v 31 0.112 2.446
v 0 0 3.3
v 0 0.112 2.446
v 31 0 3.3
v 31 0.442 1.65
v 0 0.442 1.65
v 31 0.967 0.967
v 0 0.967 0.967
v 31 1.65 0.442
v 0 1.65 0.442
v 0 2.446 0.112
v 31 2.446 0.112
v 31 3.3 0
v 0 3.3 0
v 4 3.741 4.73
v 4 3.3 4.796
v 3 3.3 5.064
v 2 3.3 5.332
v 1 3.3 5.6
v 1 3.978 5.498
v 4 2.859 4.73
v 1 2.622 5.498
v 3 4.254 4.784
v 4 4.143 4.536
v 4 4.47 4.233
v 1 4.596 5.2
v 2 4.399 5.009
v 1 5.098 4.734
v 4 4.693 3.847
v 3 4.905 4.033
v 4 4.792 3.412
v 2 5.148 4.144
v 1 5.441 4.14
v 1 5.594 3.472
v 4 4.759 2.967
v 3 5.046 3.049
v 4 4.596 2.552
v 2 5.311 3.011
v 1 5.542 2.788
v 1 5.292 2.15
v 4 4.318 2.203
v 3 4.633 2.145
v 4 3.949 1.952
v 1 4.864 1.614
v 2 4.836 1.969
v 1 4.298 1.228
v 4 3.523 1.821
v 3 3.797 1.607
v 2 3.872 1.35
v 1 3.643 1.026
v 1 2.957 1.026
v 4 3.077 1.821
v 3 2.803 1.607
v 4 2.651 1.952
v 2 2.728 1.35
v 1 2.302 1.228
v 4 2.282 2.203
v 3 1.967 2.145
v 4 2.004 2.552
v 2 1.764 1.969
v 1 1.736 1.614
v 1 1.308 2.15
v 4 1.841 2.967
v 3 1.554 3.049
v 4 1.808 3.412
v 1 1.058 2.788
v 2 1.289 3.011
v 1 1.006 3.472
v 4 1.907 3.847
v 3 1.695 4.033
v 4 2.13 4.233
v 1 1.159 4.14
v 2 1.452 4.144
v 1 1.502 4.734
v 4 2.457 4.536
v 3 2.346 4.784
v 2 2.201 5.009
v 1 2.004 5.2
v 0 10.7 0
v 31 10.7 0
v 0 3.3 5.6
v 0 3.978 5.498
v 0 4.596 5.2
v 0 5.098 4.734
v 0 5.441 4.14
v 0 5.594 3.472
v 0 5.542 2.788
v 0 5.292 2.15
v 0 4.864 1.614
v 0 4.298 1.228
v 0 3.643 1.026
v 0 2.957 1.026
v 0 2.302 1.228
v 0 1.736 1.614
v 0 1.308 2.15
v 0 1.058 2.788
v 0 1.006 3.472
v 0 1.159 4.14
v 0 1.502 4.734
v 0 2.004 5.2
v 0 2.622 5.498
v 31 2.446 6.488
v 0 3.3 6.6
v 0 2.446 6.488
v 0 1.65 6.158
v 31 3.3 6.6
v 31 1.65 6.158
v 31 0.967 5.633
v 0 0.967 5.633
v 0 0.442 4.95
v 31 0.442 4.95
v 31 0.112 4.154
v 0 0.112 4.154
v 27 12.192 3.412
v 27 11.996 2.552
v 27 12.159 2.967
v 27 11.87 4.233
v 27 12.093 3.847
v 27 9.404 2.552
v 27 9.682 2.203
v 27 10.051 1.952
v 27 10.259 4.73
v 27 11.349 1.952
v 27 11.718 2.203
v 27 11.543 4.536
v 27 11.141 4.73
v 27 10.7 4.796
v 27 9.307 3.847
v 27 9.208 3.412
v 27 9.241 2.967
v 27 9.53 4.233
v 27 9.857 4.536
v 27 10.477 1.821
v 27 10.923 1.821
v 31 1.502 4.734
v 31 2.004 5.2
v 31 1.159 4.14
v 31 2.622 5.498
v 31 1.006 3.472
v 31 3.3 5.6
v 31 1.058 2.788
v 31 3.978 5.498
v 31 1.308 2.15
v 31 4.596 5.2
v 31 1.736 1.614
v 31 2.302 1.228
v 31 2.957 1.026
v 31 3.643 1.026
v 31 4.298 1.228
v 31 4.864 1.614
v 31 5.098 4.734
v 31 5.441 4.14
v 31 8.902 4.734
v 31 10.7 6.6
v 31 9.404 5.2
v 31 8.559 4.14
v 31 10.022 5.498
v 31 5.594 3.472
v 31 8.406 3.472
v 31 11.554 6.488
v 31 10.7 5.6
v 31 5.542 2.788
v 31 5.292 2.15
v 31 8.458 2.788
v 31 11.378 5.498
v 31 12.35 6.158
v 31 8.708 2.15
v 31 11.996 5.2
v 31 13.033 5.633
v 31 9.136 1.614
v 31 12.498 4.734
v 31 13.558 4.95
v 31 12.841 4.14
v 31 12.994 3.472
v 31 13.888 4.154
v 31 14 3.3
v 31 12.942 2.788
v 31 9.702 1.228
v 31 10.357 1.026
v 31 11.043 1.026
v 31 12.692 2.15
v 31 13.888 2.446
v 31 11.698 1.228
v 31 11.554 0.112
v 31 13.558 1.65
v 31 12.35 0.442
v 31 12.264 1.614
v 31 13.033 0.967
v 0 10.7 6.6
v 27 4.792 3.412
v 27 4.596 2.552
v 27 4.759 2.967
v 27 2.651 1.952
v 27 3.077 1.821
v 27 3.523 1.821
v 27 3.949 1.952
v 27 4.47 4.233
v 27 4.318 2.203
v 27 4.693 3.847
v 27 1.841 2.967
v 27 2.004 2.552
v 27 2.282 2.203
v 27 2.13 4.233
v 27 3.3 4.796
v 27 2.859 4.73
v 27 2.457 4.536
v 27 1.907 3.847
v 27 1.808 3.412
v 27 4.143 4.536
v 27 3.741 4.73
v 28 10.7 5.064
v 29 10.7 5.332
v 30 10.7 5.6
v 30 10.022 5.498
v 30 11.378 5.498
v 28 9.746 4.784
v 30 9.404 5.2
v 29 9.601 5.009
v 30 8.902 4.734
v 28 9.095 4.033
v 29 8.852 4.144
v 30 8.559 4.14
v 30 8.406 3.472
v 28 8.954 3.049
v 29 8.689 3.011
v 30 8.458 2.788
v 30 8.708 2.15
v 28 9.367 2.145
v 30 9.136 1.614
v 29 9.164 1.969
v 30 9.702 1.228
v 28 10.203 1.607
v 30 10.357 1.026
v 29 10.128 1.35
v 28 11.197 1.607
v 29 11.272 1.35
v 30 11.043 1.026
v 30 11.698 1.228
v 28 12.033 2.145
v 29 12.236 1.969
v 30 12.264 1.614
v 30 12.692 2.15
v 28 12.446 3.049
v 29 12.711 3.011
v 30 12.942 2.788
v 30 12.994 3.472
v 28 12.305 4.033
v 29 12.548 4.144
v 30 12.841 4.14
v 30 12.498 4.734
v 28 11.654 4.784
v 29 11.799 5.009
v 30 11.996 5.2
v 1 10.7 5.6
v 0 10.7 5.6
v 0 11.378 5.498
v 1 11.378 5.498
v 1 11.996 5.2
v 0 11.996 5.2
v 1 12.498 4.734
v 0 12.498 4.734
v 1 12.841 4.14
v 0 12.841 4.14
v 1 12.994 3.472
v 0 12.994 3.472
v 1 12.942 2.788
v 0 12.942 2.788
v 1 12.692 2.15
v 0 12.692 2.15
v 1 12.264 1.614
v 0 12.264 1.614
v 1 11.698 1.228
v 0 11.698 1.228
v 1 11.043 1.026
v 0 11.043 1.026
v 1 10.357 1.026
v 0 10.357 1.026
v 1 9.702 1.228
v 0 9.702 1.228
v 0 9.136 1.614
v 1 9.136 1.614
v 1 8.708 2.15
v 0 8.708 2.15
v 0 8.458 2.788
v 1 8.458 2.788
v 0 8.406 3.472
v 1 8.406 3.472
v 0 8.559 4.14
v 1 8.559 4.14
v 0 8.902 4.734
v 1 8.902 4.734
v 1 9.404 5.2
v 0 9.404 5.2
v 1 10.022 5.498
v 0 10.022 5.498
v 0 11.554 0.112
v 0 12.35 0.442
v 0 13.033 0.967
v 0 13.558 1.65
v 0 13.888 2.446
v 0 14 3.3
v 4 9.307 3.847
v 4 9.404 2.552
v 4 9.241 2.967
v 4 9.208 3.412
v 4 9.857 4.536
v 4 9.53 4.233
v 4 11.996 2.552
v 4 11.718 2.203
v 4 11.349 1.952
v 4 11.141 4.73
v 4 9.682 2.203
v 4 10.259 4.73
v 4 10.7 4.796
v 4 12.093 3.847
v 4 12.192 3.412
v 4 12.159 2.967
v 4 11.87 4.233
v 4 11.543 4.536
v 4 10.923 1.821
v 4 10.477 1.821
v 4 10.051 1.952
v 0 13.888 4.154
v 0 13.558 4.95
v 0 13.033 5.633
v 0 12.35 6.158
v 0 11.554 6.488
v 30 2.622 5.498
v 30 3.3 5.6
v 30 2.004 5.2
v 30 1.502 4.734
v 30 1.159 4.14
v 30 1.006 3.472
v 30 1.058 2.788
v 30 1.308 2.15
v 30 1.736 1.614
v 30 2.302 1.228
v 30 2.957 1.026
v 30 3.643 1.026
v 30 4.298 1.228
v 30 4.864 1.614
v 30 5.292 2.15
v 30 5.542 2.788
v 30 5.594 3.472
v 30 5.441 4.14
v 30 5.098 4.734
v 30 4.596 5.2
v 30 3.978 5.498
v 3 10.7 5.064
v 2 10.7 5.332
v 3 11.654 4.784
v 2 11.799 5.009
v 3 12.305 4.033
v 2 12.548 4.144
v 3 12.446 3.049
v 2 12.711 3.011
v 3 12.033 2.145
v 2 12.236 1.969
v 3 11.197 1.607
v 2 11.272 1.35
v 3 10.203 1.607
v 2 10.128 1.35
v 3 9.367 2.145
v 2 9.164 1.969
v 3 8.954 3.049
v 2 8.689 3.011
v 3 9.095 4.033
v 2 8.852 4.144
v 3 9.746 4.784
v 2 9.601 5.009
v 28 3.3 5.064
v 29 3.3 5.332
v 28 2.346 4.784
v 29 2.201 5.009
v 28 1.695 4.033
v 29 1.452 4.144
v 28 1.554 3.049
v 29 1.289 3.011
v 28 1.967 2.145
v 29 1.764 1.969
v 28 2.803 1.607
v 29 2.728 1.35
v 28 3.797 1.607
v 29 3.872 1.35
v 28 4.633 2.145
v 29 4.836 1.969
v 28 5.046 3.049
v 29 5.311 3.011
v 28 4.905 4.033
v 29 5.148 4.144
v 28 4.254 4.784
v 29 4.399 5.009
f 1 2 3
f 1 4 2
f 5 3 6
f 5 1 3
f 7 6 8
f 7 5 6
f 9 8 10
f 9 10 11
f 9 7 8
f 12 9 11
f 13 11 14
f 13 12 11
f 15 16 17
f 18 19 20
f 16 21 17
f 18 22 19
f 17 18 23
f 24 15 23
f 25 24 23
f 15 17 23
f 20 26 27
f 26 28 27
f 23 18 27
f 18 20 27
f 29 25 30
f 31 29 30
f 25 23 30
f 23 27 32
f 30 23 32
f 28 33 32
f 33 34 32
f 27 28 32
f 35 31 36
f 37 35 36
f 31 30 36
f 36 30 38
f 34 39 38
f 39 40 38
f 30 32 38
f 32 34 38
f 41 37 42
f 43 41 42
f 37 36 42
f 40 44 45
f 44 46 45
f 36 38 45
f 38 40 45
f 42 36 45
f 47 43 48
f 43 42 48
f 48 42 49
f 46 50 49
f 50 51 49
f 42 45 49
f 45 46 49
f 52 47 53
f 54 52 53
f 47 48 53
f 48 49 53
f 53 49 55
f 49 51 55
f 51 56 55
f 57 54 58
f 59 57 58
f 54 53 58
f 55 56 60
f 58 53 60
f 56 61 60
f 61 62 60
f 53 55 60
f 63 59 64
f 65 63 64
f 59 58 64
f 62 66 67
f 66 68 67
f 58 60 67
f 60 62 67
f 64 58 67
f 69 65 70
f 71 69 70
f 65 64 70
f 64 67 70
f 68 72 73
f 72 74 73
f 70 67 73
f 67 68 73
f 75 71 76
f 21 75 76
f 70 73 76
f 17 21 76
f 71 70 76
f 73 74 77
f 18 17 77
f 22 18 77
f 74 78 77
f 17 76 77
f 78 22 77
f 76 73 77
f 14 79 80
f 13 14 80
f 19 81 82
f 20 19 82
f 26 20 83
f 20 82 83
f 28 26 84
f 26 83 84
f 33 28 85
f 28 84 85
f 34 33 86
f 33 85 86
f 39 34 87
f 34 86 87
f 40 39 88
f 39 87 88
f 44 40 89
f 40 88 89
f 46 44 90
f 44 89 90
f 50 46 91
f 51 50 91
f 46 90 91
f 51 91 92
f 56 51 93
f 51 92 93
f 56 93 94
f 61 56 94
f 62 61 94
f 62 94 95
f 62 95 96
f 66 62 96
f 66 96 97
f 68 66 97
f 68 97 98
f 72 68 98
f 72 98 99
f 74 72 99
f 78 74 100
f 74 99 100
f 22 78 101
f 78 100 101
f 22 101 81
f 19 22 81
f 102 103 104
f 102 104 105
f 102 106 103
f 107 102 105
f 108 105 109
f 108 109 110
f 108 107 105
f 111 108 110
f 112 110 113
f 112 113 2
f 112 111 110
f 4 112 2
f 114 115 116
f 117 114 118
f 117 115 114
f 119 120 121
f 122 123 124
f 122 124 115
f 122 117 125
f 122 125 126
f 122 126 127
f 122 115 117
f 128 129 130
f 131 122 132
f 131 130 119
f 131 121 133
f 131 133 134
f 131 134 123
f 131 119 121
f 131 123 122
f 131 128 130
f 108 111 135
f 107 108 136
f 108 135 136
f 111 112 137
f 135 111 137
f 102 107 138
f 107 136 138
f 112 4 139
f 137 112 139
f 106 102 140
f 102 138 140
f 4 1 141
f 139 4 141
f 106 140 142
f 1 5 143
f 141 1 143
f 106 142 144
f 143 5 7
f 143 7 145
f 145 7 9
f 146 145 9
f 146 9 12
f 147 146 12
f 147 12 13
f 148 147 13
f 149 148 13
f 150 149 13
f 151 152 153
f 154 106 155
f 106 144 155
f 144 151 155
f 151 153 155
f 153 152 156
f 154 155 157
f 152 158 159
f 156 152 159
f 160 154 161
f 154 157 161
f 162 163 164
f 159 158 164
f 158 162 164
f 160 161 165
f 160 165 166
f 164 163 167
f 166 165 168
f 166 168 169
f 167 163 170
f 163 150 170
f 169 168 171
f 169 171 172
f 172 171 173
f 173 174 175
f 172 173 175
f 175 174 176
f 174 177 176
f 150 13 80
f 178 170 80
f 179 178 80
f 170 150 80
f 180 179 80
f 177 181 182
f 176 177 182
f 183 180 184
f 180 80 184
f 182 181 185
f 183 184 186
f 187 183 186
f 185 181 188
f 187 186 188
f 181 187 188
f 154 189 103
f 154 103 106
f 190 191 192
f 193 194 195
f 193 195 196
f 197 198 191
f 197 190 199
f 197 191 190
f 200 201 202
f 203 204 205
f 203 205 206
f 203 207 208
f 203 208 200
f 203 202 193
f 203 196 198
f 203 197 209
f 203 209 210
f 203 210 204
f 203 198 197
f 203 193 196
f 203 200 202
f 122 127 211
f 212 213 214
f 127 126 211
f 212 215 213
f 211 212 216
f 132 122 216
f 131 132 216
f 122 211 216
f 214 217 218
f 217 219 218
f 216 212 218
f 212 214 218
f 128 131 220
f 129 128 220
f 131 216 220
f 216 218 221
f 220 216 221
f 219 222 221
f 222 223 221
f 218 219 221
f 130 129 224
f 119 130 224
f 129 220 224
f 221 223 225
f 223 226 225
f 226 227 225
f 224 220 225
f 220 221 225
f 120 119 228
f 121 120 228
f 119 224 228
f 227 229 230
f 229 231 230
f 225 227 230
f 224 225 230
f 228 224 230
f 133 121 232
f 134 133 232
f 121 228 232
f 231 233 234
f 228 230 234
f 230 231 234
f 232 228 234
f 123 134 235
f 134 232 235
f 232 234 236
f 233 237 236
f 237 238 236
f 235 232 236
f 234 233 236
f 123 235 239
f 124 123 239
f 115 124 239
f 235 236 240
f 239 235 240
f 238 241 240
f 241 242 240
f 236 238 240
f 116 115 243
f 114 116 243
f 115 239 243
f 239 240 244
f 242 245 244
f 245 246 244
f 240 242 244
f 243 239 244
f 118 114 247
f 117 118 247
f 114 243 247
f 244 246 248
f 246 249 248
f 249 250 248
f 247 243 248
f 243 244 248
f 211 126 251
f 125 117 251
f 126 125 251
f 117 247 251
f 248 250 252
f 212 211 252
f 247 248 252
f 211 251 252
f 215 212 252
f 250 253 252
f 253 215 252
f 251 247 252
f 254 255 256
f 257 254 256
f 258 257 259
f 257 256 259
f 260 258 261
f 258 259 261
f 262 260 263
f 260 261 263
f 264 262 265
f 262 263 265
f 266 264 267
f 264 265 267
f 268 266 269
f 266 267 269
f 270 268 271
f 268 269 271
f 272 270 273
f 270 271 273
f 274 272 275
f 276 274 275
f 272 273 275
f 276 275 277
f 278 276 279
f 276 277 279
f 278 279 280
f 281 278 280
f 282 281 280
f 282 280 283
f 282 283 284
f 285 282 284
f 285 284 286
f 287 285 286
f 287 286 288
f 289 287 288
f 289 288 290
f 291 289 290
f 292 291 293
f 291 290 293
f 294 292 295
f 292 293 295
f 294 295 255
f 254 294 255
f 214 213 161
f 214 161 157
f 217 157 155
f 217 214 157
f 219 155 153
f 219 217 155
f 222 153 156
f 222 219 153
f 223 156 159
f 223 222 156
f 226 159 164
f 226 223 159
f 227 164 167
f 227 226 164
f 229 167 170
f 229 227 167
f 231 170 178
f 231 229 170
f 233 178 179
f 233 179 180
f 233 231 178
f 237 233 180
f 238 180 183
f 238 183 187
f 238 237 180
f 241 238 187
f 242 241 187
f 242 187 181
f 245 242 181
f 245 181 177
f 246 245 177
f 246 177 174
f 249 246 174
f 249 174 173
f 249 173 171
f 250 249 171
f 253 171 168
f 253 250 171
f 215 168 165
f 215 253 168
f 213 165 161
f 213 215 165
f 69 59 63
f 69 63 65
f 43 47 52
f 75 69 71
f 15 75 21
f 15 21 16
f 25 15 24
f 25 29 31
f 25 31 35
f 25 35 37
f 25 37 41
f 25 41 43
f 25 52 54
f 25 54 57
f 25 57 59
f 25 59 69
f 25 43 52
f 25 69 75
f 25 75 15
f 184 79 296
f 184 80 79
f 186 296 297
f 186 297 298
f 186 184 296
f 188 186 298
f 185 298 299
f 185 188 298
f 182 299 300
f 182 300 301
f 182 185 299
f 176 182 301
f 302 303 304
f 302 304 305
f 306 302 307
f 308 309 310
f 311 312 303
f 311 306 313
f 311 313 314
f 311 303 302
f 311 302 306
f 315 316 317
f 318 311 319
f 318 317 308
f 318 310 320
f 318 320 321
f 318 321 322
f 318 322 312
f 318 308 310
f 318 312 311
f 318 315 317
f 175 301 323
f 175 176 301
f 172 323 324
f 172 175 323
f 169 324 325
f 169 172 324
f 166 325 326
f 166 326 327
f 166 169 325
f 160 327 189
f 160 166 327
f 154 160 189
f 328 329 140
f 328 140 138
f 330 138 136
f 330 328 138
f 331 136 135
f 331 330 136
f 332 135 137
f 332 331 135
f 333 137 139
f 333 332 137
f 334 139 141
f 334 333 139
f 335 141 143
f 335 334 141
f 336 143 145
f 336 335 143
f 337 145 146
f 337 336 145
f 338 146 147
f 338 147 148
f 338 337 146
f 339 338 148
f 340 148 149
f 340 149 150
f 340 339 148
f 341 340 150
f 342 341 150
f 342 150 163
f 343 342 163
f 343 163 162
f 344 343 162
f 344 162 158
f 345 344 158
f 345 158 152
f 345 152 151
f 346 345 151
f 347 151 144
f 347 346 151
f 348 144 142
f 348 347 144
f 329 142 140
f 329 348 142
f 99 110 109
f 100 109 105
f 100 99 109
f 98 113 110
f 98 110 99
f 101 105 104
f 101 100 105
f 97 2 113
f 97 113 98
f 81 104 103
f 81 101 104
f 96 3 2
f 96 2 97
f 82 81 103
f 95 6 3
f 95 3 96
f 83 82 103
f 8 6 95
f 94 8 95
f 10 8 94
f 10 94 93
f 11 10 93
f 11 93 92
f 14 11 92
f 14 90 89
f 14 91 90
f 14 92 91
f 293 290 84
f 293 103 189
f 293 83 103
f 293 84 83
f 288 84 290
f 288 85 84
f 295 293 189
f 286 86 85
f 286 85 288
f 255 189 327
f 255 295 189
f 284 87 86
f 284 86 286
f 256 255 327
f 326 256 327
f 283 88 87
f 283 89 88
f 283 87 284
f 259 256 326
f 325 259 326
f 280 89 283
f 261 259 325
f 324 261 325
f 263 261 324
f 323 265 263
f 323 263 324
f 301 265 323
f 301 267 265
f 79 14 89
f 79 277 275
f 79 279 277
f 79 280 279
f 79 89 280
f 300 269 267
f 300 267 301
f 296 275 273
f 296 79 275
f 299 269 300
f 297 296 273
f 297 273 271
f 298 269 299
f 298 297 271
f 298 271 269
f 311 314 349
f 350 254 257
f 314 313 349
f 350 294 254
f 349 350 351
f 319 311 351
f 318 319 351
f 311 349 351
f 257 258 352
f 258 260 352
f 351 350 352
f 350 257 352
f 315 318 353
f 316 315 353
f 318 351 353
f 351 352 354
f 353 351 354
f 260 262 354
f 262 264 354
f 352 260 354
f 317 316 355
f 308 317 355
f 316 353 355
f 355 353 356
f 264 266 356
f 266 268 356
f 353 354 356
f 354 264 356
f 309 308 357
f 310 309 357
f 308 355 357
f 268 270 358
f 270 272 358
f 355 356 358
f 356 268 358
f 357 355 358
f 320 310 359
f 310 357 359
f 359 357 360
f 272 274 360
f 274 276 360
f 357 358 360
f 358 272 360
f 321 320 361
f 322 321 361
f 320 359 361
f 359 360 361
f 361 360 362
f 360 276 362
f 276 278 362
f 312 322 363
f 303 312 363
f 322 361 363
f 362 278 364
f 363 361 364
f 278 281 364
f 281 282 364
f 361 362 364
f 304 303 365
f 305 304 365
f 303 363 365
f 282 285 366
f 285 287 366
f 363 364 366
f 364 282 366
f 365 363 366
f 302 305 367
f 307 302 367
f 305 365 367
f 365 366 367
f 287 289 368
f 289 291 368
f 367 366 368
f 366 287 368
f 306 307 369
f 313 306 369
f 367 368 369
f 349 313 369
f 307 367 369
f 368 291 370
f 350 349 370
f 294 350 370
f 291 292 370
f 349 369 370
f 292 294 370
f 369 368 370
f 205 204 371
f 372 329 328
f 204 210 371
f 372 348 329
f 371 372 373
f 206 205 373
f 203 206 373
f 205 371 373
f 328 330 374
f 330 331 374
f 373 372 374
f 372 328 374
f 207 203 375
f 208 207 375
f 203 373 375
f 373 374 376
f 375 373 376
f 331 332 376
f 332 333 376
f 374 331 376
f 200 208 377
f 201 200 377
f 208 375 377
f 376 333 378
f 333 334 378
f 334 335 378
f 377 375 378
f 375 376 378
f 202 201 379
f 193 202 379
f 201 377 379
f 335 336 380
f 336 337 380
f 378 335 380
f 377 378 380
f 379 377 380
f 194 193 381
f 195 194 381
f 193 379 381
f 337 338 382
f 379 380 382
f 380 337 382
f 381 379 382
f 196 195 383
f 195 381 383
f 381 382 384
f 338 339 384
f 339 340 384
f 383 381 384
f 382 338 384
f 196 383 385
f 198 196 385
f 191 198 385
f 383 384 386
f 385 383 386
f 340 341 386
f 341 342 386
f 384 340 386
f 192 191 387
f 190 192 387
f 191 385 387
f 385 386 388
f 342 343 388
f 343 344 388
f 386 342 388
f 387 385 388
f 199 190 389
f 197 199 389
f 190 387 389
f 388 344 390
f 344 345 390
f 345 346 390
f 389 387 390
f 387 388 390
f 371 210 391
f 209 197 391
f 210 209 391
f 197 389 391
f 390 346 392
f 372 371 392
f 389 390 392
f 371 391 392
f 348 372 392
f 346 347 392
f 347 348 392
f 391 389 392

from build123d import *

# Parameters (mm, degrees)
SKETCH1_W                = 31
SKETCH1_H                = 14
BOSS_EXTRUDE1_DEPTH      = 6.6
SKETCH2_R                = 2.3
CUT_EXTRUDE1_DEPTH       = 1
ZAOBLIT7_R               = 3.3
ZAOBLIT12_R              = 3.3
ZAOBLIT13_R              = 3.3
ZAOBLIT14_R              = 3.3
ODEBRAT_START            = -1
SKICA1_R                 = 2.3
ODEBRAT_VYSUNUT_M1_DEPTH = 1
SKICA3_R                 = 2.3
ODEBRAT_VYSUNUT_M2_DEPTH = 3
ODEBRAT_VYSUNUT_M2_DRAFT = -15
SKICA4_R                 = 2.3
ODEBRAT_VYSUNUT_M3_DEPTH = 3
ODEBRAT_VYSUNUT_M3_DRAFT = -15
SKICA5_R                 = 2.3
ODEBRAT_VYSUNUT_M4_DEPTH = 3
ODEBRAT_VYSUNUT_M4_DRAFT = -15
SKICA6_R                 = 2.3
ODEBRAT_VYSUNUT_M5_DEPTH = 3
ODEBRAT_VYSUNUT_M5_DRAFT = -15


with BuildPart() as part:
    # Sketch1 → Boss-Extrude1 (new body)
    with BuildSketch(Plane.XY):
        with Locations((15.5, 7)):
            Rectangle(SKETCH1_W, SKETCH1_H)
    extrude(amount=BOSS_EXTRUDE1_DEPTH)

    # Sketch2 → Cut-Extrude1 (cut)
    with BuildSketch(Plane.ZY):
        with Locations((3.3, 10.7)):
            Circle(SKETCH2_R)
        with Locations((3.3, 3.3)):
            Circle(SKETCH2_R)
    extrude(amount=-CUT_EXTRUDE1_DEPTH, mode=Mode.SUBTRACT)

    # Zaoblit7
    zaoblit7_edges = [part.edges().sort_by_distance(p)[0] for p in [
        (15.5, 14, 0),
    ]]
    fillet(zaoblit7_edges, radius=ZAOBLIT7_R)

    # Zaoblit12
    zaoblit12_edges = [part.edges().sort_by_distance(p)[0] for p in [
        (15.5, 14, 6.6),
    ]]
    fillet(zaoblit12_edges, radius=ZAOBLIT12_R - 0.0001)  # a hair under: the kernel refuses the full size

    # Zaoblit13
    zaoblit13_edges = [part.edges().sort_by_distance(p)[0] for p in [
        (15.5, 0, 6.6),
    ]]
    fillet(zaoblit13_edges, radius=ZAOBLIT13_R)

    # Zaoblit14
    zaoblit14_edges = [part.edges().sort_by_distance(p)[0] for p in [
        (15.5, 0, 0),
    ]]
    fillet(zaoblit14_edges, radius=ZAOBLIT14_R - 0.0001)  # a hair under: the kernel refuses the full size

    # Skica1 → Odebrat vysunutím1 (cut)
    with BuildSketch(Plane(origin=(31, 0, 0), x_dir=(0, 0, -1), z_dir=(1, 0, 0)).offset(ODEBRAT_START)):
        with Locations(Location((-3.3, 10.7, 0), (0, 0, 180))):
            Circle(SKICA1_R)
        with Locations(Location((-3.3, 3.3, 0), (0, 0, 180))):
            Circle(SKICA1_R)
    extrude(amount=ODEBRAT_VYSUNUT_M1_DEPTH, mode=Mode.SUBTRACT)


with BuildPart() as odebrat_vysunut_m2_tool:
    # Skica3 → Odebrat vysunutím2 (with draft: the straight prism first)
    with BuildSketch(Plane.ZY.offset(-1)):
        with Locations((3.3, 10.7)):
            Circle(SKICA3_R)
    extrude(amount=-ODEBRAT_VYSUNUT_M2_DEPTH)
    # Odebrat vysunutím2: the draft: its side faces are tilted about the plane it starts from
    odebrat_vysunut_m2_sides = [odebrat_vysunut_m2_tool.faces().sort_by_distance(p)[0] for p in [
        (2.5, 10.7, 1),
    ]]
    draft(odebrat_vysunut_m2_sides, Plane.ZY.offset(-1), ODEBRAT_VYSUNUT_M2_DRAFT)


with BuildPart() as part_1:
    add(part.part)

    # Odebrat vysunutím2: cut by odebrat_vysunut_m2_tool
    add(odebrat_vysunut_m2_tool.part, mode=Mode.SUBTRACT)


with BuildPart() as odebrat_vysunut_m3_tool:
    # Skica4 → Odebrat vysunutím3 (with draft: the straight prism first)
    with BuildSketch(Plane.ZY.offset(-1)):
        with Locations((3.3, 3.3)):
            Circle(SKICA4_R)
    extrude(amount=-ODEBRAT_VYSUNUT_M3_DEPTH)
    # Odebrat vysunutím3: the draft: its side faces are tilted about the plane it starts from
    odebrat_vysunut_m3_sides = [odebrat_vysunut_m3_tool.faces().sort_by_distance(p)[0] for p in [
        (2.5, 3.3, 1),
    ]]
    draft(odebrat_vysunut_m3_sides, Plane.ZY.offset(-1), ODEBRAT_VYSUNUT_M3_DRAFT)


with BuildPart() as part_2:
    add(part_1.part)

    # Odebrat vysunutím3: cut by odebrat_vysunut_m3_tool
    add(odebrat_vysunut_m3_tool.part, mode=Mode.SUBTRACT)


with BuildPart() as odebrat_vysunut_m4_tool:
    # Skica5 → Odebrat vysunutím4 (with draft: the straight prism first)
    with BuildSketch(Plane(origin=(30, 0, 0), x_dir=(0, 0, -1), z_dir=(1, 0, 0))):
        with Locations(Location((-3.3, 10.7, 0), (0, 0, 180))):
            Circle(SKICA5_R)
    extrude(amount=-ODEBRAT_VYSUNUT_M4_DEPTH)
    # Odebrat vysunutím4: the draft: its side faces are tilted about the plane it starts from
    odebrat_vysunut_m4_sides = [odebrat_vysunut_m4_tool.faces().sort_by_distance(p)[0] for p in [
        (28.5, 10.7, 1),
    ]]
    draft(odebrat_vysunut_m4_sides, Plane(origin=(30, 0, 0), x_dir=(0, 0, -1), z_dir=(1, 0, 0)), ODEBRAT_VYSUNUT_M4_DRAFT)


with BuildPart() as part_3:
    add(part_2.part)

    # Odebrat vysunutím4: cut by odebrat_vysunut_m4_tool
    add(odebrat_vysunut_m4_tool.part, mode=Mode.SUBTRACT)


with BuildPart() as odebrat_vysunut_m5_tool:
    # Skica6 → Odebrat vysunutím5 (with draft: the straight prism first)
    with BuildSketch(Plane(origin=(30, 0, 0), x_dir=(0, 0, -1), z_dir=(1, 0, 0))):
        with Locations(Location((-3.3, 3.3, 0), (0, 0, 180))):
            Circle(SKICA6_R)
    extrude(amount=-ODEBRAT_VYSUNUT_M5_DEPTH)
    # Odebrat vysunutím5: the draft: its side faces are tilted about the plane it starts from
    odebrat_vysunut_m5_sides = [odebrat_vysunut_m5_tool.faces().sort_by_distance(p)[0] for p in [
        (28.5, 3.3, 1),
    ]]
    draft(odebrat_vysunut_m5_sides, Plane(origin=(30, 0, 0), x_dir=(0, 0, -1), z_dir=(1, 0, 0)), ODEBRAT_VYSUNUT_M5_DRAFT)


with BuildPart() as part_4:
    add(part_3.part)

    # Odebrat vysunutím5: cut by odebrat_vysunut_m5_tool
    add(odebrat_vysunut_m5_tool.part, mode=Mode.SUBTRACT)


solid = part_4.part
